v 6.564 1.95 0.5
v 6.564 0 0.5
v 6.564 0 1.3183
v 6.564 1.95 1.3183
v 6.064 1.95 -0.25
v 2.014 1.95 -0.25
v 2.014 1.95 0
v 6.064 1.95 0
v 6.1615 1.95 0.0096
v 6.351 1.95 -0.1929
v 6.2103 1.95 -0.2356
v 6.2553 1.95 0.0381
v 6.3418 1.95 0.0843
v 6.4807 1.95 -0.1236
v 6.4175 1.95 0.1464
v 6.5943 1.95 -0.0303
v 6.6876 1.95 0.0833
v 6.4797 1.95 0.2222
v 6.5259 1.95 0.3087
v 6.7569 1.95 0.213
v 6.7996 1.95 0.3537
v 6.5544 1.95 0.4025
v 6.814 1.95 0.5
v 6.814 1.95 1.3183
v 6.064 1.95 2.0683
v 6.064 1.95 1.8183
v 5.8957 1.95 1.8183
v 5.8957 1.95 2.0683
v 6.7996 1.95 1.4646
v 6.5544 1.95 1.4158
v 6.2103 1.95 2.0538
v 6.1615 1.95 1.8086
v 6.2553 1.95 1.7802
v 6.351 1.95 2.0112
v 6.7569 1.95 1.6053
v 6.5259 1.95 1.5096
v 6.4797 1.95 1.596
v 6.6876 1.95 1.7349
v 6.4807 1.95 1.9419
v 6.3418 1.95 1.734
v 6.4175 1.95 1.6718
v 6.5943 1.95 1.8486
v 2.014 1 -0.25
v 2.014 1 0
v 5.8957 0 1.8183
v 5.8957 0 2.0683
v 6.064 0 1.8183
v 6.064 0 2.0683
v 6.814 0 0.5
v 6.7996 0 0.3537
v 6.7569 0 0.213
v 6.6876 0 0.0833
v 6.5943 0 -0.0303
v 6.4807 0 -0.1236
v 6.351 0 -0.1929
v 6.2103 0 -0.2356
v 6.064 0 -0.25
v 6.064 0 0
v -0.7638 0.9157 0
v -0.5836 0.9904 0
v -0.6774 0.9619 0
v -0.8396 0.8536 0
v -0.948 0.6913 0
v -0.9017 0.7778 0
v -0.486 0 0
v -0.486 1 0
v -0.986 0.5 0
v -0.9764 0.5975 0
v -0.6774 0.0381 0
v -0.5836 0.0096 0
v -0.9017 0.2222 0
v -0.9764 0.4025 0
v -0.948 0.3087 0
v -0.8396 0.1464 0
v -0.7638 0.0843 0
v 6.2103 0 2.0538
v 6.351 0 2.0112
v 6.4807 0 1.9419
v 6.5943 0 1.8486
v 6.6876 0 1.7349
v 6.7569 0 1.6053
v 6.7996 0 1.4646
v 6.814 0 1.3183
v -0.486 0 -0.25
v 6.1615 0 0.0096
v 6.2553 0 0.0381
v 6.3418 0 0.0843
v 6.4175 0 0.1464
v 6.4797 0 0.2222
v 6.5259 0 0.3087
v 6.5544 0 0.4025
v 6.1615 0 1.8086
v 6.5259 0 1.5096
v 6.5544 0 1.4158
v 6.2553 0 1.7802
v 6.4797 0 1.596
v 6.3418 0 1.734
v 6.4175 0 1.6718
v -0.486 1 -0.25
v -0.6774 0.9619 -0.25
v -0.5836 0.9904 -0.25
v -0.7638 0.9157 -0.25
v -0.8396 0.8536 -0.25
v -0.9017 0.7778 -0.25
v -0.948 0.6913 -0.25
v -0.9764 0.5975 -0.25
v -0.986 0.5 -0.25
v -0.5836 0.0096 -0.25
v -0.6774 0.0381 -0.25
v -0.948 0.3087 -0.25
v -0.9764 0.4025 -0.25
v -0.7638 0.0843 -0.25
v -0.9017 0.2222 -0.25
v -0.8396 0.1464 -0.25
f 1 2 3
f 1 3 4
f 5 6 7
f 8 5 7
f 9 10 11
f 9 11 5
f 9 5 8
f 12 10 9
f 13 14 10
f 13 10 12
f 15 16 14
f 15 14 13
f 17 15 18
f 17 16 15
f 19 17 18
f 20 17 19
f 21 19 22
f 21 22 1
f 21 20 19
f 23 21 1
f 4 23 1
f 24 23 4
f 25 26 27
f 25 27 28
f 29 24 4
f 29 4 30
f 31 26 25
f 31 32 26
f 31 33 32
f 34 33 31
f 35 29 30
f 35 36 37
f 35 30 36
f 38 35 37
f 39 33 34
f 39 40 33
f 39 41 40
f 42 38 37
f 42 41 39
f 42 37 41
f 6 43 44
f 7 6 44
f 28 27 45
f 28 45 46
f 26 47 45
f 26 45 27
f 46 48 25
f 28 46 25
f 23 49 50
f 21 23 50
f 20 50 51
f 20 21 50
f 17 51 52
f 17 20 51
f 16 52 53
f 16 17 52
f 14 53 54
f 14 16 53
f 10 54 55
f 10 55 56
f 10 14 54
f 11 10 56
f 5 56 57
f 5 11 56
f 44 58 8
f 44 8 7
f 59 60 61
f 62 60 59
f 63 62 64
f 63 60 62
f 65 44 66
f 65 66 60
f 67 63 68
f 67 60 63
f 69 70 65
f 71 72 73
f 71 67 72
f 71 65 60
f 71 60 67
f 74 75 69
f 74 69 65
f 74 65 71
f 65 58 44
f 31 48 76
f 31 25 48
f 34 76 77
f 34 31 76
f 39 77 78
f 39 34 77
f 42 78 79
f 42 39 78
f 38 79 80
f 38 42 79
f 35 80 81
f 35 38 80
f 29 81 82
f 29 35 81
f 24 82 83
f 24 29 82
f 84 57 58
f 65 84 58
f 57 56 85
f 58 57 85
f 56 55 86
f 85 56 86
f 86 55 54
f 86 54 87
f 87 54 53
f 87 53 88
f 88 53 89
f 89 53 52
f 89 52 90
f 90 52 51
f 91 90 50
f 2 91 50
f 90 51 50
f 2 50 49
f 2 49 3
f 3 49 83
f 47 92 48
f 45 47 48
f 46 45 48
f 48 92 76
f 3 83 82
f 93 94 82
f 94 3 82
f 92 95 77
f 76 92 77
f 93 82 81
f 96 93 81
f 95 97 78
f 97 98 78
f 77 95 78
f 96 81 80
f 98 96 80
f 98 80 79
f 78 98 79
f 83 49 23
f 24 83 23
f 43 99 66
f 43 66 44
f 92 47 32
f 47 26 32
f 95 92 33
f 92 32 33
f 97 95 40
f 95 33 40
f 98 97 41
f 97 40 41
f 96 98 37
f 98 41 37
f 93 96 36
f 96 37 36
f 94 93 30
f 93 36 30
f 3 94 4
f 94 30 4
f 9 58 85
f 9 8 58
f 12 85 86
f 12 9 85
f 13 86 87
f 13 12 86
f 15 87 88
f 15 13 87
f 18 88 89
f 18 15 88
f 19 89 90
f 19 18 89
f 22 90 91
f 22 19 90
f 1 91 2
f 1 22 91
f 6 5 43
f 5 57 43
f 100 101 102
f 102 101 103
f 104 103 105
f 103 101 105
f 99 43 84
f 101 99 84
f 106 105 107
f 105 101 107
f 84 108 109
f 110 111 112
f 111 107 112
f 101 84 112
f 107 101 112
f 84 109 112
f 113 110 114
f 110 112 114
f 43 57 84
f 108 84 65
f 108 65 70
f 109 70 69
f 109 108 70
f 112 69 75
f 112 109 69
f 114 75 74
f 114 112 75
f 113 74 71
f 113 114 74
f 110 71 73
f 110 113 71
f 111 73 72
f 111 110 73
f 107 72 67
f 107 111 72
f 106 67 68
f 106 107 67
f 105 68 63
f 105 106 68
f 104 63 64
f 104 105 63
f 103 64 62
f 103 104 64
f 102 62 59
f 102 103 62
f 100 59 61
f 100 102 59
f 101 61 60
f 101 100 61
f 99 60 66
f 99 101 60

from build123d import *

# Parameters (mm, degrees)
EXTRUDE_1_DEPTH = 0.25
SKETCH_2_W      = 4.8
SKETCH_2_H      = 0.25
EXTRUDE_2_DEPTH = 0.95
SKETCH_3_W      = 0.25
SKETCH_3_H      = 1.95
EXTRUDE_3_DEPTH = 2.068252296
SKETCH_4_W      = 0.25
SKETCH_4_H      = 1.95
EXTRUDE_4_DEPTH = 0.668252296
FILLET_1_R      = 0.5
FILLET_2_R      = 0.75


with BuildPart() as part:
    # 草图1 → 凸台-拉伸1 (new body)
    with BuildSketch(Plane(origin=(0, 0, -0.25), x_dir=(-1, 0, 0), z_dir=(0, 0, -1))):
        with BuildLine():
            Line((0.486013986, 1), (-6.813986014, 1))
            Line((-6.813986014, 1), (-6.813986014, 0))
            Line((-6.813986014, 0), (0.486013986, 0))
            ThreePointArc((0.486013986, 0), (0.986013986, 0.5), (0.486013986, 1))
        make_face()
    extrude(amount=-EXTRUDE_1_DEPTH)

    # 草图2 → 凸台-拉伸2 (add)
    with BuildSketch(Plane(origin=(0, 1, 0), x_dir=(-1, 0, 0), z_dir=(0, 1, 0))):
        with Locations((-4.413986014, -0.125)):
            Rectangle(SKETCH_2_W, SKETCH_2_H)
    extrude(amount=EXTRUDE_2_DEPTH)

    # 草图3 → 凸台-拉伸3 (add)
    with BuildSketch(Plane.XY):
        with Locations((6.688986014, 0.975)):
            Rectangle(SKETCH_3_W, SKETCH_3_H)
    extrude(amount=EXTRUDE_3_DEPTH)

    # 草图4 → 凸台-拉伸4 (add)
    with BuildSketch(Plane.ZY.offset(-6.563986014)):
        with Locations((1.943252296, 0.975)):
            Rectangle(SKETCH_4_W, SKETCH_4_H)
    extrude(amount=EXTRUDE_4_DEPTH)

    # 圆角1
    fillet_1_edges = [part.edges().sort_by_distance(p)[0] for p in [
        (6.563986014, 0.975, 0),
        (6.563986014, 0.975, 1.818252296),
    ]]
    fillet(fillet_1_edges, radius=FILLET_1_R)

    # 圆角2
    fillet_2_edges = [part.edges().sort_by_distance(p)[0] for p in [
        (6.813986014, 0.975, 2.068252296),
        (6.813986014, 0.975, -0.25),
    ]]
    fillet(fillet_2_edges, radius=FILLET_2_R)


solid = part.part
